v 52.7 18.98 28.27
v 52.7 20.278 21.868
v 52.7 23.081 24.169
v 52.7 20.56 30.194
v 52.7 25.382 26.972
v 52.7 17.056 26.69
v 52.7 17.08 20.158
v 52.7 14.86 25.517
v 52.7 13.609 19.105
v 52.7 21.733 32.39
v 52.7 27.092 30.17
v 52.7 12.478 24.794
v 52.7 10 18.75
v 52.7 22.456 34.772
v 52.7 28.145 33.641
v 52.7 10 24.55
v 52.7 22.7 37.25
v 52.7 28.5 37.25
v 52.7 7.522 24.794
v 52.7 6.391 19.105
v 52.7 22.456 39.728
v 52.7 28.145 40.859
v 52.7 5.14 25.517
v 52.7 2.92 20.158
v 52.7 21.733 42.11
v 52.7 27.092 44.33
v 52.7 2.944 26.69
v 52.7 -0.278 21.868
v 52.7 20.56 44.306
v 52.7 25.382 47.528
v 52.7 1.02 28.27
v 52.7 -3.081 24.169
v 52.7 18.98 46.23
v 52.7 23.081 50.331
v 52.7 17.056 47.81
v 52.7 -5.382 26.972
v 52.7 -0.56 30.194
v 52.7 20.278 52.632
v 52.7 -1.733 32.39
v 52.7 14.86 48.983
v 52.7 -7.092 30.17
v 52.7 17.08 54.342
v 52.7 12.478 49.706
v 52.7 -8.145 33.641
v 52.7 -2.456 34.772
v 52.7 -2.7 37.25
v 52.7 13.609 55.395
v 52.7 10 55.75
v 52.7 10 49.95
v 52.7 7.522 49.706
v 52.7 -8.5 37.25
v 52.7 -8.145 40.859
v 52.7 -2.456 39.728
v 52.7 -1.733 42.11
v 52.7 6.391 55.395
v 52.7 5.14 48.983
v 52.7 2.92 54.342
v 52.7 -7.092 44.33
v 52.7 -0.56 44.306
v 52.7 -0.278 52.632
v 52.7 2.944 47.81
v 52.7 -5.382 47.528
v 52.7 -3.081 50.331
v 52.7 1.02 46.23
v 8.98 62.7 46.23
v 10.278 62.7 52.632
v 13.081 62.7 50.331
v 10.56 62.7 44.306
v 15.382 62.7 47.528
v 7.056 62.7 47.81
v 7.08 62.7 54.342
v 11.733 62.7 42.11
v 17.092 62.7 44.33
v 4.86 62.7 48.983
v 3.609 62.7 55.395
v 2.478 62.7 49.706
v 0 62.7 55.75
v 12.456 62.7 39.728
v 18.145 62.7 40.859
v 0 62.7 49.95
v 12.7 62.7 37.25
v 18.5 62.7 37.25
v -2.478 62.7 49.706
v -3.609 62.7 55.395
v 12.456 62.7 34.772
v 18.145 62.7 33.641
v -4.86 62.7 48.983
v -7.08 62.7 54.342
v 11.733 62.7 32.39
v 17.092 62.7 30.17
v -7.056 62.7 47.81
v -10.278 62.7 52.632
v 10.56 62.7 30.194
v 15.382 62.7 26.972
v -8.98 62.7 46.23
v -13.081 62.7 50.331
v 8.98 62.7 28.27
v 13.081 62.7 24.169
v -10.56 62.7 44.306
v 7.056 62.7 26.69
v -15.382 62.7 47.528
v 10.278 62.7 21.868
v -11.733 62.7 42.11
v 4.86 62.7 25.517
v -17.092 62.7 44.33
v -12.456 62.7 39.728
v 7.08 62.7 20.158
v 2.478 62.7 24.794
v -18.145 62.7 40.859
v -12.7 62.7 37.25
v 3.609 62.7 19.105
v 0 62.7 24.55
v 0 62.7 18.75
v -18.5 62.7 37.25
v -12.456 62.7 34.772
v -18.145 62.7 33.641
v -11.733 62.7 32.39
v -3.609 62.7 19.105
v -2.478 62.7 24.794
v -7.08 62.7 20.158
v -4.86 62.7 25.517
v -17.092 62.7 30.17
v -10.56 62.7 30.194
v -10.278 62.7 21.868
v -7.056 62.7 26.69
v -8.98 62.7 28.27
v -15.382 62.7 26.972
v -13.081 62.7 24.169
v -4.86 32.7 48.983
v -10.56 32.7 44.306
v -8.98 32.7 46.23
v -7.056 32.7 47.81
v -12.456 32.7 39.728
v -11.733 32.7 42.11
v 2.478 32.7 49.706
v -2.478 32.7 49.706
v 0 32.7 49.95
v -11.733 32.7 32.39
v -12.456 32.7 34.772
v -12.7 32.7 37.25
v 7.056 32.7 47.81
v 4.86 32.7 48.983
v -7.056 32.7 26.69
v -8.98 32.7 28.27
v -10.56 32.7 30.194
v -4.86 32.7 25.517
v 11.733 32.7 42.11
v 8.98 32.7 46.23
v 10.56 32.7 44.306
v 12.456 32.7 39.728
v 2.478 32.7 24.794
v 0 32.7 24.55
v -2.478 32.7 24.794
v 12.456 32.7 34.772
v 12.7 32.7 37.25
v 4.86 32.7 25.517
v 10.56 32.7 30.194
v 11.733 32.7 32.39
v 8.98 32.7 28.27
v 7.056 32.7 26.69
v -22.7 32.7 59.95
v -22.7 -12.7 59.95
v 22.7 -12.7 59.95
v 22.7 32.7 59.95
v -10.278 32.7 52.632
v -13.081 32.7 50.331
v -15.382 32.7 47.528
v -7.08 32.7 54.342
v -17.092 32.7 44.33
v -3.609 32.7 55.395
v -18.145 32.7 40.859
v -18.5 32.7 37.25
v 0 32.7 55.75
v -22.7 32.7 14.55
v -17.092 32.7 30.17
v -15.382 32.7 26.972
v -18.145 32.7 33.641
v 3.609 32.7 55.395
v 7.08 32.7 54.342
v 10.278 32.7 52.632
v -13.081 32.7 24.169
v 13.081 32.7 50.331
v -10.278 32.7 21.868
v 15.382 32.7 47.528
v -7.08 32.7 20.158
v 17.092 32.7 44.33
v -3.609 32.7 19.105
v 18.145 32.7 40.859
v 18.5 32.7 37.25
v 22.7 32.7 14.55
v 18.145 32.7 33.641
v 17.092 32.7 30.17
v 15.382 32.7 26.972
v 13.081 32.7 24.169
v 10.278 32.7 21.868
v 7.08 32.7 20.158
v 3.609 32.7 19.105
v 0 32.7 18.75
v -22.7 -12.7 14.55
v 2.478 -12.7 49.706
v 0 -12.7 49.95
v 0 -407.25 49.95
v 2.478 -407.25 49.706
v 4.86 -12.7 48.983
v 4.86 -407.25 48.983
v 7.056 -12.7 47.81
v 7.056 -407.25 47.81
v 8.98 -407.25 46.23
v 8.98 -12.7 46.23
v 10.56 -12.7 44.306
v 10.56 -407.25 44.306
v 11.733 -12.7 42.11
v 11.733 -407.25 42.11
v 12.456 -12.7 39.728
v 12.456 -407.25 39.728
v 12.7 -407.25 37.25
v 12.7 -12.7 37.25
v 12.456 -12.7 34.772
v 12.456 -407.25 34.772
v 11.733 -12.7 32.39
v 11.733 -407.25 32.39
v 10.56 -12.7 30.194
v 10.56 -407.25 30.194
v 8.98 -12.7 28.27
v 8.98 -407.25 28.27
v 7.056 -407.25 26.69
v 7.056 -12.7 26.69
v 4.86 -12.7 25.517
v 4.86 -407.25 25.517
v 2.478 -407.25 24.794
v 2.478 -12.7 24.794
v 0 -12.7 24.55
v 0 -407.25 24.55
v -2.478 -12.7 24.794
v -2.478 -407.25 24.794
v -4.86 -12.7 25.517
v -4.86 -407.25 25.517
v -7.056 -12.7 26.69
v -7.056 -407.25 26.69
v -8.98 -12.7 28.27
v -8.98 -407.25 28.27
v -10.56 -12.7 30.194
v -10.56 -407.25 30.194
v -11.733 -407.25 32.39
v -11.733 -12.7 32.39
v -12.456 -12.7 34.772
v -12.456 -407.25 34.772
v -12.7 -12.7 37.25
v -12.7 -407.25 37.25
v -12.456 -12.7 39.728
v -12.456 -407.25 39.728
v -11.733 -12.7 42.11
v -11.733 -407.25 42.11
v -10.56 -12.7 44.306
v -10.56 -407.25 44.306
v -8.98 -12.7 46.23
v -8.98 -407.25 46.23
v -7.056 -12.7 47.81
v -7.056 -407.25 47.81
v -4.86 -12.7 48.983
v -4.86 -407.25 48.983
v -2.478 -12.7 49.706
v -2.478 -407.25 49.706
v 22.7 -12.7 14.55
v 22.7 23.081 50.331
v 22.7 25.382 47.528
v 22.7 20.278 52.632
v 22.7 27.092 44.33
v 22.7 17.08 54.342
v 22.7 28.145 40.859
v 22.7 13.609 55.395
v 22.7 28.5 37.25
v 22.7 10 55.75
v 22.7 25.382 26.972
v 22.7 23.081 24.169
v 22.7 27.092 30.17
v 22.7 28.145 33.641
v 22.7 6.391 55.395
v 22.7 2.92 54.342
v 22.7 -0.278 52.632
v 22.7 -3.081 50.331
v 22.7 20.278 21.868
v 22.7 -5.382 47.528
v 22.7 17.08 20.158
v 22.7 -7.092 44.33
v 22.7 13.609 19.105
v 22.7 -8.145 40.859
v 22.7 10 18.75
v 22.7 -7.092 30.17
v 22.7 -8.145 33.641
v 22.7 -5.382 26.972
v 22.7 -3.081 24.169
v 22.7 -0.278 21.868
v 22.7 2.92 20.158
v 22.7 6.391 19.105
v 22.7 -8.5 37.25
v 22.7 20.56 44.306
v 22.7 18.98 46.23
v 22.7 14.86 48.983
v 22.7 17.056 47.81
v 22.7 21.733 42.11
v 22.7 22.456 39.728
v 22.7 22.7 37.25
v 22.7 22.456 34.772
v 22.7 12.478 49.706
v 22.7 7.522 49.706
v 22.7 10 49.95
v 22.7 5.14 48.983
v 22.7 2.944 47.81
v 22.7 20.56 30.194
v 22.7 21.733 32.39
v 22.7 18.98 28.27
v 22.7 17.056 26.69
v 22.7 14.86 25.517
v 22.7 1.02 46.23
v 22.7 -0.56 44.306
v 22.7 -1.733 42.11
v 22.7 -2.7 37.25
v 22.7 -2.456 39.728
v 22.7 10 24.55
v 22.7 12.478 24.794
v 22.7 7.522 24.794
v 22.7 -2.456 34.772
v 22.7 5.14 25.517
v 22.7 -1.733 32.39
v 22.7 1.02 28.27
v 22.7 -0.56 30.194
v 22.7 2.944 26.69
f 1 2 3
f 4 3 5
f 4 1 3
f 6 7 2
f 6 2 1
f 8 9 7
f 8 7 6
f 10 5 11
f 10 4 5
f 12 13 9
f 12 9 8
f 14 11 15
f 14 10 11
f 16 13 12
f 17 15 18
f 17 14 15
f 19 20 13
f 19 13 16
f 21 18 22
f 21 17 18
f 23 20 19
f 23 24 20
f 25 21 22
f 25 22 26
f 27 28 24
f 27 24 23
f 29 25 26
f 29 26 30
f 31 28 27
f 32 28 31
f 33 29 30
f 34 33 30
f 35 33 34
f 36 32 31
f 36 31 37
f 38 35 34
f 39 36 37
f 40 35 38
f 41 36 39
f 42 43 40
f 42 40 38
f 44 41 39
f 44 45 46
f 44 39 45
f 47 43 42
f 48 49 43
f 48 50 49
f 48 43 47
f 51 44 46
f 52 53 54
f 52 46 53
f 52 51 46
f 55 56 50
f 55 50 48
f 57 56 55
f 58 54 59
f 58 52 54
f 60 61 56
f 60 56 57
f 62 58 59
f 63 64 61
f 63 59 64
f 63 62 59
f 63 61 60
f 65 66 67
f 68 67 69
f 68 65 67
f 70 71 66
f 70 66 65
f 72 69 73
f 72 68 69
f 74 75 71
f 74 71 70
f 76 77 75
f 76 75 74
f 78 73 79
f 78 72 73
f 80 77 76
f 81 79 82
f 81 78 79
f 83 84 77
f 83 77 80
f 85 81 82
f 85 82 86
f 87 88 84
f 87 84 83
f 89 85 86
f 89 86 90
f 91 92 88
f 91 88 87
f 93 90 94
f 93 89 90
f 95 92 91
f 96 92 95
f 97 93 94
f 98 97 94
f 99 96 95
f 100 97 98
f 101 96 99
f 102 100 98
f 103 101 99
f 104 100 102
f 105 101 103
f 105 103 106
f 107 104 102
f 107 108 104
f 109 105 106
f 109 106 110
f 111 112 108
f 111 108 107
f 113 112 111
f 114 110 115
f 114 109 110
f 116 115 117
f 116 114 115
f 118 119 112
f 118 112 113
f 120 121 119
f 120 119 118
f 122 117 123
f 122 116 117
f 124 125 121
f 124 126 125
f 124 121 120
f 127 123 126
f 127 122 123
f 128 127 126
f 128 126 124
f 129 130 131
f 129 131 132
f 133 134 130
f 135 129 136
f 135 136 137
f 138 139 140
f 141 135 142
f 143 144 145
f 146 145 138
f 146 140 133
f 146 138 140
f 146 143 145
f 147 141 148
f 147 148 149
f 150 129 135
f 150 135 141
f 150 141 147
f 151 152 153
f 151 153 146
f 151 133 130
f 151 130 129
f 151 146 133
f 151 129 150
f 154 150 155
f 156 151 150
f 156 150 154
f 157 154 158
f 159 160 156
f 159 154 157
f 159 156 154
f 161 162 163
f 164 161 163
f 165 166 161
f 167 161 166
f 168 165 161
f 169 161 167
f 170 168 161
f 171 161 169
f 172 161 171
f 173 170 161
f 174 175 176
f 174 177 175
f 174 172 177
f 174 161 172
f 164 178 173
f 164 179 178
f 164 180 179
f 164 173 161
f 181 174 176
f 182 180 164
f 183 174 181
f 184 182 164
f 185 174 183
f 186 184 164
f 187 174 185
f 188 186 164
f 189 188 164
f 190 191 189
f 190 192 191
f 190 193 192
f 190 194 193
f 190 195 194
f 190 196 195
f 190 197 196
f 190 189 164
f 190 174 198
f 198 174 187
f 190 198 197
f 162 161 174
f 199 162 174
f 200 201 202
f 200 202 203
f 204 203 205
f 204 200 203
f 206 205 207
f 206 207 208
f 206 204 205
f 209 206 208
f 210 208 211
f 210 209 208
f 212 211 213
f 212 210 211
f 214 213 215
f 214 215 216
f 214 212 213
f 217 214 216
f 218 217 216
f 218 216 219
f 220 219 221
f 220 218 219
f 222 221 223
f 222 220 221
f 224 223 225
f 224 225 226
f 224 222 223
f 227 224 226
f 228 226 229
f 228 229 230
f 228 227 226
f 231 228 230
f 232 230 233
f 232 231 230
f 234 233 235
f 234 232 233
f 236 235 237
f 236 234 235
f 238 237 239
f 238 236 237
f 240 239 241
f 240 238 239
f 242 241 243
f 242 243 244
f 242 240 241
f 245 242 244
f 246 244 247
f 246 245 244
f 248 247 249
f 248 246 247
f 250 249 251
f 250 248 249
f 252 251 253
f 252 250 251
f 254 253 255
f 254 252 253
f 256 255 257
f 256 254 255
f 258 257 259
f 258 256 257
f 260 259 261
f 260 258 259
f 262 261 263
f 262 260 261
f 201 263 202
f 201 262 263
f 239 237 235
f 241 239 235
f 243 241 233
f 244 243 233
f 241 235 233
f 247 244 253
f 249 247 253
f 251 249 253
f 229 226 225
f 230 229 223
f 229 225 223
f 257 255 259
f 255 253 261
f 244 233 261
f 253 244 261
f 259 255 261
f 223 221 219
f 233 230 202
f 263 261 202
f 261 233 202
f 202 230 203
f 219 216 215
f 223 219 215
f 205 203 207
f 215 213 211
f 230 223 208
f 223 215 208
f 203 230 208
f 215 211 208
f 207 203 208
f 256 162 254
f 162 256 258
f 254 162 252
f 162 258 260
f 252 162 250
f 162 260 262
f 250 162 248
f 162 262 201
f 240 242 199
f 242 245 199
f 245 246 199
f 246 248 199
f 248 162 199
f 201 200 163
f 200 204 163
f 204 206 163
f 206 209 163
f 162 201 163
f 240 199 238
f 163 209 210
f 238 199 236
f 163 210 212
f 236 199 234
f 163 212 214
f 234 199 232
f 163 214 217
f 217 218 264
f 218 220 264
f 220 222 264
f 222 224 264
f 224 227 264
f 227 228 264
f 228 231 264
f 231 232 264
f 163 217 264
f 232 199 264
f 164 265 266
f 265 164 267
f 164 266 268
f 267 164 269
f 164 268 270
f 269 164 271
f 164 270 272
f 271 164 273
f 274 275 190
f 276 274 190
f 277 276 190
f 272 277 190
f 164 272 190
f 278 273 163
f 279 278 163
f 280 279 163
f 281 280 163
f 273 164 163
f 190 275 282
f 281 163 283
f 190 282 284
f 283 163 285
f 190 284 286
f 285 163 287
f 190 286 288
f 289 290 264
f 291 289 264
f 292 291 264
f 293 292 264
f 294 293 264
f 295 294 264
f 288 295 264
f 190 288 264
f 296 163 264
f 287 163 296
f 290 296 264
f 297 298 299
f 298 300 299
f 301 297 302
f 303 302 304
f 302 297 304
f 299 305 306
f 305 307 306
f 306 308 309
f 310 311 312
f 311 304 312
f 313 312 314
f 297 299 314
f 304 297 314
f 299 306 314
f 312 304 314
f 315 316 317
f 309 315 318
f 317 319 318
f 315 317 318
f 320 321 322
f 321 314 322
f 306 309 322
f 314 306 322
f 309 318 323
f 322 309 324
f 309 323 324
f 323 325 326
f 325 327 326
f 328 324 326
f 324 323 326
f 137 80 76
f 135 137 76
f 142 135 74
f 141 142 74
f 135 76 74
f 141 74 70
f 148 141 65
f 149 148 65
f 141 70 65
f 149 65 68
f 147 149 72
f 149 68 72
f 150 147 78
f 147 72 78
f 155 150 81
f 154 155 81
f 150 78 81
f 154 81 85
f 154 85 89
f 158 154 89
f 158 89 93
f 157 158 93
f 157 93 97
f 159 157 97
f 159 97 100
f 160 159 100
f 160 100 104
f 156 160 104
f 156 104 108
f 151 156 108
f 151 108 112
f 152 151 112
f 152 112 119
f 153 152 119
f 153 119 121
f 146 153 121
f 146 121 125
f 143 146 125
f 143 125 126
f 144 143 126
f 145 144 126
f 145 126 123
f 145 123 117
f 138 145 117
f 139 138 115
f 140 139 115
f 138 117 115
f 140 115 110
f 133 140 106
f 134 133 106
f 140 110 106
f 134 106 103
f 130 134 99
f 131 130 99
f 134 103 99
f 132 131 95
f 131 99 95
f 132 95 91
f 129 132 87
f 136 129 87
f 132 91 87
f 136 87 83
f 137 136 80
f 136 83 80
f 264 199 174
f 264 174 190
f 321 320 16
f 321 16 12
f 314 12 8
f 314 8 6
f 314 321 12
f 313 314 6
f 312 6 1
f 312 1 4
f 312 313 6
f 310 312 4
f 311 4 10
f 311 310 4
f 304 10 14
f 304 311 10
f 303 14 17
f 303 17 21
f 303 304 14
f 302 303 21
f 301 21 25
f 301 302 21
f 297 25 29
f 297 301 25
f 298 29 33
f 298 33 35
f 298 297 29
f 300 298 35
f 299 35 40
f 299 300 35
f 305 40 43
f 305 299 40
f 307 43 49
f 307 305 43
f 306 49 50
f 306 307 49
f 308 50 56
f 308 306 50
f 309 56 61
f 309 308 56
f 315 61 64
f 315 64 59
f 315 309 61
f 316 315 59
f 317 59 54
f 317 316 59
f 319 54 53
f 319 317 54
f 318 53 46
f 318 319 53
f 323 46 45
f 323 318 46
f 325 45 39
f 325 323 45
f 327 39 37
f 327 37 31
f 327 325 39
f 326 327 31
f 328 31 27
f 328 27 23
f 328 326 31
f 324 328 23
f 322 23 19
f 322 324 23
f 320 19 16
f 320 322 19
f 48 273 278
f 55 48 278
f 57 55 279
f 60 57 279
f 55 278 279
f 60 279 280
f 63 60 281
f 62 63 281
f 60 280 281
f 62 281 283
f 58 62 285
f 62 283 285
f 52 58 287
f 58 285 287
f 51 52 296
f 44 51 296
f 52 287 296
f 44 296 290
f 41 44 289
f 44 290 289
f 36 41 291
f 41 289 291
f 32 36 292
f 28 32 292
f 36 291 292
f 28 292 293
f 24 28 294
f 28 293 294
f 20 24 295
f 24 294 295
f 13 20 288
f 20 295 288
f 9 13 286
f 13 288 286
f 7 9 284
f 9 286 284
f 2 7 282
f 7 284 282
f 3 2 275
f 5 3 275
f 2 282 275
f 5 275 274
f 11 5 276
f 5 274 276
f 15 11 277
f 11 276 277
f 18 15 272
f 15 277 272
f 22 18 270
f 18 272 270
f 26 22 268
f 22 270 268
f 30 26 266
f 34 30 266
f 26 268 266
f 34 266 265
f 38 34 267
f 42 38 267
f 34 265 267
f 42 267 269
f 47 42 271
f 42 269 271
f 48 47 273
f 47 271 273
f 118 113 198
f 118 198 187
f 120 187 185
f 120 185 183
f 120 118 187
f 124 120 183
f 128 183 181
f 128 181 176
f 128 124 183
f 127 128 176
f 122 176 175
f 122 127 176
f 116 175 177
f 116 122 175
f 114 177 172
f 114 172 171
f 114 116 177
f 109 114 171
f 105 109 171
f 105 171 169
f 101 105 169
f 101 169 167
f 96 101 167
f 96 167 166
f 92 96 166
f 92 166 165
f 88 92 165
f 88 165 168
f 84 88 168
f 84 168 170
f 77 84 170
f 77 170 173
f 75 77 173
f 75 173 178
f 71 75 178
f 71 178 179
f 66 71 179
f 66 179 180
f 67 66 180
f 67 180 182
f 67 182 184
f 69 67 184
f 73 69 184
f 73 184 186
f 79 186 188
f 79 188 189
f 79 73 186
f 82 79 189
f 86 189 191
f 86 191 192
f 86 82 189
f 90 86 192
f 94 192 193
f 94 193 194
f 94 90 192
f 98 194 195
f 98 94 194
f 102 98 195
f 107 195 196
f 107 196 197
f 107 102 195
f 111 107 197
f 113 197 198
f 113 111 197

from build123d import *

# Parameters (mm, degrees)
CROQUIS2_R              = 12.7
SALIENTE_EXTRUIR1_DEPTH = 394.55
CROQUIS4_W              = 45.4
CROQUIS4_H              = 45.4
SALIENTE_EXTRUIR2_DEPTH = 45.4
CROQUIS5_R              = 18.5
CROQUIS5_R_2            = 12.7
SALIENTE_EXTRUIR3_DEPTH = 30
SALIENTE_EXTRUIR4_START = 75.4
CROQUIS7_R              = 18.5
CROQUIS7_R_2            = 12.7
SALIENTE_EXTRUIR4_DEPTH = 75.4


with BuildPart() as part:
    # Croquis2 → Saliente-Extruir1 (new body)
    with BuildSketch(Plane(origin=(0, -12.7, 0), x_dir=(1, 0, 0), z_dir=(0, 1, 0))):
        with Locations(Location((0, -37.25, 0), (0, 0, 270))):
            Circle(CROQUIS2_R)
    extrude(amount=-SALIENTE_EXTRUIR1_DEPTH)

    # Croquis4 → Saliente-Extruir2 (add)
    with BuildSketch(Plane(origin=(0, -12.7, 0), x_dir=(1, 0, 0), z_dir=(0, 1, 0))):
        with Locations((0, -37.25)):
            Rectangle(CROQUIS4_W, CROQUIS4_H)
    extrude(amount=SALIENTE_EXTRUIR2_DEPTH)

    # Croquis5 → Saliente-Extruir3 (add)
    with BuildSketch(Plane(origin=(22.7, 0, 0), x_dir=(0, 0, -1), z_dir=(1, 0, 0))):
        with Locations(Location((-37.25, 10, 0), (0, 0, 180))):
            Circle(CROQUIS5_R)
        with Locations((-37.25, 10)):
            Circle(CROQUIS5_R_2, mode=Mode.SUBTRACT)
    extrude(amount=SALIENTE_EXTRUIR3_DEPTH)

    # Croquis7 → Saliente-Extruir4 (add)
    with BuildSketch(Plane(origin=(0, -12.7, 0), x_dir=(1, 0, 0), z_dir=(0, 1, 0)).offset(SALIENTE_EXTRUIR4_START)):
        with Locations(Location((0, -37.25, 0), (0, 0, 90))):
            Circle(CROQUIS7_R)
        with Locations(Location((0, -37.25, 0), (0, 0, 270))):
            Circle(CROQUIS7_R_2, mode=Mode.SUBTRACT)
    extrude(amount=-SALIENTE_EXTRUIR4_DEPTH)


solid = part.part
